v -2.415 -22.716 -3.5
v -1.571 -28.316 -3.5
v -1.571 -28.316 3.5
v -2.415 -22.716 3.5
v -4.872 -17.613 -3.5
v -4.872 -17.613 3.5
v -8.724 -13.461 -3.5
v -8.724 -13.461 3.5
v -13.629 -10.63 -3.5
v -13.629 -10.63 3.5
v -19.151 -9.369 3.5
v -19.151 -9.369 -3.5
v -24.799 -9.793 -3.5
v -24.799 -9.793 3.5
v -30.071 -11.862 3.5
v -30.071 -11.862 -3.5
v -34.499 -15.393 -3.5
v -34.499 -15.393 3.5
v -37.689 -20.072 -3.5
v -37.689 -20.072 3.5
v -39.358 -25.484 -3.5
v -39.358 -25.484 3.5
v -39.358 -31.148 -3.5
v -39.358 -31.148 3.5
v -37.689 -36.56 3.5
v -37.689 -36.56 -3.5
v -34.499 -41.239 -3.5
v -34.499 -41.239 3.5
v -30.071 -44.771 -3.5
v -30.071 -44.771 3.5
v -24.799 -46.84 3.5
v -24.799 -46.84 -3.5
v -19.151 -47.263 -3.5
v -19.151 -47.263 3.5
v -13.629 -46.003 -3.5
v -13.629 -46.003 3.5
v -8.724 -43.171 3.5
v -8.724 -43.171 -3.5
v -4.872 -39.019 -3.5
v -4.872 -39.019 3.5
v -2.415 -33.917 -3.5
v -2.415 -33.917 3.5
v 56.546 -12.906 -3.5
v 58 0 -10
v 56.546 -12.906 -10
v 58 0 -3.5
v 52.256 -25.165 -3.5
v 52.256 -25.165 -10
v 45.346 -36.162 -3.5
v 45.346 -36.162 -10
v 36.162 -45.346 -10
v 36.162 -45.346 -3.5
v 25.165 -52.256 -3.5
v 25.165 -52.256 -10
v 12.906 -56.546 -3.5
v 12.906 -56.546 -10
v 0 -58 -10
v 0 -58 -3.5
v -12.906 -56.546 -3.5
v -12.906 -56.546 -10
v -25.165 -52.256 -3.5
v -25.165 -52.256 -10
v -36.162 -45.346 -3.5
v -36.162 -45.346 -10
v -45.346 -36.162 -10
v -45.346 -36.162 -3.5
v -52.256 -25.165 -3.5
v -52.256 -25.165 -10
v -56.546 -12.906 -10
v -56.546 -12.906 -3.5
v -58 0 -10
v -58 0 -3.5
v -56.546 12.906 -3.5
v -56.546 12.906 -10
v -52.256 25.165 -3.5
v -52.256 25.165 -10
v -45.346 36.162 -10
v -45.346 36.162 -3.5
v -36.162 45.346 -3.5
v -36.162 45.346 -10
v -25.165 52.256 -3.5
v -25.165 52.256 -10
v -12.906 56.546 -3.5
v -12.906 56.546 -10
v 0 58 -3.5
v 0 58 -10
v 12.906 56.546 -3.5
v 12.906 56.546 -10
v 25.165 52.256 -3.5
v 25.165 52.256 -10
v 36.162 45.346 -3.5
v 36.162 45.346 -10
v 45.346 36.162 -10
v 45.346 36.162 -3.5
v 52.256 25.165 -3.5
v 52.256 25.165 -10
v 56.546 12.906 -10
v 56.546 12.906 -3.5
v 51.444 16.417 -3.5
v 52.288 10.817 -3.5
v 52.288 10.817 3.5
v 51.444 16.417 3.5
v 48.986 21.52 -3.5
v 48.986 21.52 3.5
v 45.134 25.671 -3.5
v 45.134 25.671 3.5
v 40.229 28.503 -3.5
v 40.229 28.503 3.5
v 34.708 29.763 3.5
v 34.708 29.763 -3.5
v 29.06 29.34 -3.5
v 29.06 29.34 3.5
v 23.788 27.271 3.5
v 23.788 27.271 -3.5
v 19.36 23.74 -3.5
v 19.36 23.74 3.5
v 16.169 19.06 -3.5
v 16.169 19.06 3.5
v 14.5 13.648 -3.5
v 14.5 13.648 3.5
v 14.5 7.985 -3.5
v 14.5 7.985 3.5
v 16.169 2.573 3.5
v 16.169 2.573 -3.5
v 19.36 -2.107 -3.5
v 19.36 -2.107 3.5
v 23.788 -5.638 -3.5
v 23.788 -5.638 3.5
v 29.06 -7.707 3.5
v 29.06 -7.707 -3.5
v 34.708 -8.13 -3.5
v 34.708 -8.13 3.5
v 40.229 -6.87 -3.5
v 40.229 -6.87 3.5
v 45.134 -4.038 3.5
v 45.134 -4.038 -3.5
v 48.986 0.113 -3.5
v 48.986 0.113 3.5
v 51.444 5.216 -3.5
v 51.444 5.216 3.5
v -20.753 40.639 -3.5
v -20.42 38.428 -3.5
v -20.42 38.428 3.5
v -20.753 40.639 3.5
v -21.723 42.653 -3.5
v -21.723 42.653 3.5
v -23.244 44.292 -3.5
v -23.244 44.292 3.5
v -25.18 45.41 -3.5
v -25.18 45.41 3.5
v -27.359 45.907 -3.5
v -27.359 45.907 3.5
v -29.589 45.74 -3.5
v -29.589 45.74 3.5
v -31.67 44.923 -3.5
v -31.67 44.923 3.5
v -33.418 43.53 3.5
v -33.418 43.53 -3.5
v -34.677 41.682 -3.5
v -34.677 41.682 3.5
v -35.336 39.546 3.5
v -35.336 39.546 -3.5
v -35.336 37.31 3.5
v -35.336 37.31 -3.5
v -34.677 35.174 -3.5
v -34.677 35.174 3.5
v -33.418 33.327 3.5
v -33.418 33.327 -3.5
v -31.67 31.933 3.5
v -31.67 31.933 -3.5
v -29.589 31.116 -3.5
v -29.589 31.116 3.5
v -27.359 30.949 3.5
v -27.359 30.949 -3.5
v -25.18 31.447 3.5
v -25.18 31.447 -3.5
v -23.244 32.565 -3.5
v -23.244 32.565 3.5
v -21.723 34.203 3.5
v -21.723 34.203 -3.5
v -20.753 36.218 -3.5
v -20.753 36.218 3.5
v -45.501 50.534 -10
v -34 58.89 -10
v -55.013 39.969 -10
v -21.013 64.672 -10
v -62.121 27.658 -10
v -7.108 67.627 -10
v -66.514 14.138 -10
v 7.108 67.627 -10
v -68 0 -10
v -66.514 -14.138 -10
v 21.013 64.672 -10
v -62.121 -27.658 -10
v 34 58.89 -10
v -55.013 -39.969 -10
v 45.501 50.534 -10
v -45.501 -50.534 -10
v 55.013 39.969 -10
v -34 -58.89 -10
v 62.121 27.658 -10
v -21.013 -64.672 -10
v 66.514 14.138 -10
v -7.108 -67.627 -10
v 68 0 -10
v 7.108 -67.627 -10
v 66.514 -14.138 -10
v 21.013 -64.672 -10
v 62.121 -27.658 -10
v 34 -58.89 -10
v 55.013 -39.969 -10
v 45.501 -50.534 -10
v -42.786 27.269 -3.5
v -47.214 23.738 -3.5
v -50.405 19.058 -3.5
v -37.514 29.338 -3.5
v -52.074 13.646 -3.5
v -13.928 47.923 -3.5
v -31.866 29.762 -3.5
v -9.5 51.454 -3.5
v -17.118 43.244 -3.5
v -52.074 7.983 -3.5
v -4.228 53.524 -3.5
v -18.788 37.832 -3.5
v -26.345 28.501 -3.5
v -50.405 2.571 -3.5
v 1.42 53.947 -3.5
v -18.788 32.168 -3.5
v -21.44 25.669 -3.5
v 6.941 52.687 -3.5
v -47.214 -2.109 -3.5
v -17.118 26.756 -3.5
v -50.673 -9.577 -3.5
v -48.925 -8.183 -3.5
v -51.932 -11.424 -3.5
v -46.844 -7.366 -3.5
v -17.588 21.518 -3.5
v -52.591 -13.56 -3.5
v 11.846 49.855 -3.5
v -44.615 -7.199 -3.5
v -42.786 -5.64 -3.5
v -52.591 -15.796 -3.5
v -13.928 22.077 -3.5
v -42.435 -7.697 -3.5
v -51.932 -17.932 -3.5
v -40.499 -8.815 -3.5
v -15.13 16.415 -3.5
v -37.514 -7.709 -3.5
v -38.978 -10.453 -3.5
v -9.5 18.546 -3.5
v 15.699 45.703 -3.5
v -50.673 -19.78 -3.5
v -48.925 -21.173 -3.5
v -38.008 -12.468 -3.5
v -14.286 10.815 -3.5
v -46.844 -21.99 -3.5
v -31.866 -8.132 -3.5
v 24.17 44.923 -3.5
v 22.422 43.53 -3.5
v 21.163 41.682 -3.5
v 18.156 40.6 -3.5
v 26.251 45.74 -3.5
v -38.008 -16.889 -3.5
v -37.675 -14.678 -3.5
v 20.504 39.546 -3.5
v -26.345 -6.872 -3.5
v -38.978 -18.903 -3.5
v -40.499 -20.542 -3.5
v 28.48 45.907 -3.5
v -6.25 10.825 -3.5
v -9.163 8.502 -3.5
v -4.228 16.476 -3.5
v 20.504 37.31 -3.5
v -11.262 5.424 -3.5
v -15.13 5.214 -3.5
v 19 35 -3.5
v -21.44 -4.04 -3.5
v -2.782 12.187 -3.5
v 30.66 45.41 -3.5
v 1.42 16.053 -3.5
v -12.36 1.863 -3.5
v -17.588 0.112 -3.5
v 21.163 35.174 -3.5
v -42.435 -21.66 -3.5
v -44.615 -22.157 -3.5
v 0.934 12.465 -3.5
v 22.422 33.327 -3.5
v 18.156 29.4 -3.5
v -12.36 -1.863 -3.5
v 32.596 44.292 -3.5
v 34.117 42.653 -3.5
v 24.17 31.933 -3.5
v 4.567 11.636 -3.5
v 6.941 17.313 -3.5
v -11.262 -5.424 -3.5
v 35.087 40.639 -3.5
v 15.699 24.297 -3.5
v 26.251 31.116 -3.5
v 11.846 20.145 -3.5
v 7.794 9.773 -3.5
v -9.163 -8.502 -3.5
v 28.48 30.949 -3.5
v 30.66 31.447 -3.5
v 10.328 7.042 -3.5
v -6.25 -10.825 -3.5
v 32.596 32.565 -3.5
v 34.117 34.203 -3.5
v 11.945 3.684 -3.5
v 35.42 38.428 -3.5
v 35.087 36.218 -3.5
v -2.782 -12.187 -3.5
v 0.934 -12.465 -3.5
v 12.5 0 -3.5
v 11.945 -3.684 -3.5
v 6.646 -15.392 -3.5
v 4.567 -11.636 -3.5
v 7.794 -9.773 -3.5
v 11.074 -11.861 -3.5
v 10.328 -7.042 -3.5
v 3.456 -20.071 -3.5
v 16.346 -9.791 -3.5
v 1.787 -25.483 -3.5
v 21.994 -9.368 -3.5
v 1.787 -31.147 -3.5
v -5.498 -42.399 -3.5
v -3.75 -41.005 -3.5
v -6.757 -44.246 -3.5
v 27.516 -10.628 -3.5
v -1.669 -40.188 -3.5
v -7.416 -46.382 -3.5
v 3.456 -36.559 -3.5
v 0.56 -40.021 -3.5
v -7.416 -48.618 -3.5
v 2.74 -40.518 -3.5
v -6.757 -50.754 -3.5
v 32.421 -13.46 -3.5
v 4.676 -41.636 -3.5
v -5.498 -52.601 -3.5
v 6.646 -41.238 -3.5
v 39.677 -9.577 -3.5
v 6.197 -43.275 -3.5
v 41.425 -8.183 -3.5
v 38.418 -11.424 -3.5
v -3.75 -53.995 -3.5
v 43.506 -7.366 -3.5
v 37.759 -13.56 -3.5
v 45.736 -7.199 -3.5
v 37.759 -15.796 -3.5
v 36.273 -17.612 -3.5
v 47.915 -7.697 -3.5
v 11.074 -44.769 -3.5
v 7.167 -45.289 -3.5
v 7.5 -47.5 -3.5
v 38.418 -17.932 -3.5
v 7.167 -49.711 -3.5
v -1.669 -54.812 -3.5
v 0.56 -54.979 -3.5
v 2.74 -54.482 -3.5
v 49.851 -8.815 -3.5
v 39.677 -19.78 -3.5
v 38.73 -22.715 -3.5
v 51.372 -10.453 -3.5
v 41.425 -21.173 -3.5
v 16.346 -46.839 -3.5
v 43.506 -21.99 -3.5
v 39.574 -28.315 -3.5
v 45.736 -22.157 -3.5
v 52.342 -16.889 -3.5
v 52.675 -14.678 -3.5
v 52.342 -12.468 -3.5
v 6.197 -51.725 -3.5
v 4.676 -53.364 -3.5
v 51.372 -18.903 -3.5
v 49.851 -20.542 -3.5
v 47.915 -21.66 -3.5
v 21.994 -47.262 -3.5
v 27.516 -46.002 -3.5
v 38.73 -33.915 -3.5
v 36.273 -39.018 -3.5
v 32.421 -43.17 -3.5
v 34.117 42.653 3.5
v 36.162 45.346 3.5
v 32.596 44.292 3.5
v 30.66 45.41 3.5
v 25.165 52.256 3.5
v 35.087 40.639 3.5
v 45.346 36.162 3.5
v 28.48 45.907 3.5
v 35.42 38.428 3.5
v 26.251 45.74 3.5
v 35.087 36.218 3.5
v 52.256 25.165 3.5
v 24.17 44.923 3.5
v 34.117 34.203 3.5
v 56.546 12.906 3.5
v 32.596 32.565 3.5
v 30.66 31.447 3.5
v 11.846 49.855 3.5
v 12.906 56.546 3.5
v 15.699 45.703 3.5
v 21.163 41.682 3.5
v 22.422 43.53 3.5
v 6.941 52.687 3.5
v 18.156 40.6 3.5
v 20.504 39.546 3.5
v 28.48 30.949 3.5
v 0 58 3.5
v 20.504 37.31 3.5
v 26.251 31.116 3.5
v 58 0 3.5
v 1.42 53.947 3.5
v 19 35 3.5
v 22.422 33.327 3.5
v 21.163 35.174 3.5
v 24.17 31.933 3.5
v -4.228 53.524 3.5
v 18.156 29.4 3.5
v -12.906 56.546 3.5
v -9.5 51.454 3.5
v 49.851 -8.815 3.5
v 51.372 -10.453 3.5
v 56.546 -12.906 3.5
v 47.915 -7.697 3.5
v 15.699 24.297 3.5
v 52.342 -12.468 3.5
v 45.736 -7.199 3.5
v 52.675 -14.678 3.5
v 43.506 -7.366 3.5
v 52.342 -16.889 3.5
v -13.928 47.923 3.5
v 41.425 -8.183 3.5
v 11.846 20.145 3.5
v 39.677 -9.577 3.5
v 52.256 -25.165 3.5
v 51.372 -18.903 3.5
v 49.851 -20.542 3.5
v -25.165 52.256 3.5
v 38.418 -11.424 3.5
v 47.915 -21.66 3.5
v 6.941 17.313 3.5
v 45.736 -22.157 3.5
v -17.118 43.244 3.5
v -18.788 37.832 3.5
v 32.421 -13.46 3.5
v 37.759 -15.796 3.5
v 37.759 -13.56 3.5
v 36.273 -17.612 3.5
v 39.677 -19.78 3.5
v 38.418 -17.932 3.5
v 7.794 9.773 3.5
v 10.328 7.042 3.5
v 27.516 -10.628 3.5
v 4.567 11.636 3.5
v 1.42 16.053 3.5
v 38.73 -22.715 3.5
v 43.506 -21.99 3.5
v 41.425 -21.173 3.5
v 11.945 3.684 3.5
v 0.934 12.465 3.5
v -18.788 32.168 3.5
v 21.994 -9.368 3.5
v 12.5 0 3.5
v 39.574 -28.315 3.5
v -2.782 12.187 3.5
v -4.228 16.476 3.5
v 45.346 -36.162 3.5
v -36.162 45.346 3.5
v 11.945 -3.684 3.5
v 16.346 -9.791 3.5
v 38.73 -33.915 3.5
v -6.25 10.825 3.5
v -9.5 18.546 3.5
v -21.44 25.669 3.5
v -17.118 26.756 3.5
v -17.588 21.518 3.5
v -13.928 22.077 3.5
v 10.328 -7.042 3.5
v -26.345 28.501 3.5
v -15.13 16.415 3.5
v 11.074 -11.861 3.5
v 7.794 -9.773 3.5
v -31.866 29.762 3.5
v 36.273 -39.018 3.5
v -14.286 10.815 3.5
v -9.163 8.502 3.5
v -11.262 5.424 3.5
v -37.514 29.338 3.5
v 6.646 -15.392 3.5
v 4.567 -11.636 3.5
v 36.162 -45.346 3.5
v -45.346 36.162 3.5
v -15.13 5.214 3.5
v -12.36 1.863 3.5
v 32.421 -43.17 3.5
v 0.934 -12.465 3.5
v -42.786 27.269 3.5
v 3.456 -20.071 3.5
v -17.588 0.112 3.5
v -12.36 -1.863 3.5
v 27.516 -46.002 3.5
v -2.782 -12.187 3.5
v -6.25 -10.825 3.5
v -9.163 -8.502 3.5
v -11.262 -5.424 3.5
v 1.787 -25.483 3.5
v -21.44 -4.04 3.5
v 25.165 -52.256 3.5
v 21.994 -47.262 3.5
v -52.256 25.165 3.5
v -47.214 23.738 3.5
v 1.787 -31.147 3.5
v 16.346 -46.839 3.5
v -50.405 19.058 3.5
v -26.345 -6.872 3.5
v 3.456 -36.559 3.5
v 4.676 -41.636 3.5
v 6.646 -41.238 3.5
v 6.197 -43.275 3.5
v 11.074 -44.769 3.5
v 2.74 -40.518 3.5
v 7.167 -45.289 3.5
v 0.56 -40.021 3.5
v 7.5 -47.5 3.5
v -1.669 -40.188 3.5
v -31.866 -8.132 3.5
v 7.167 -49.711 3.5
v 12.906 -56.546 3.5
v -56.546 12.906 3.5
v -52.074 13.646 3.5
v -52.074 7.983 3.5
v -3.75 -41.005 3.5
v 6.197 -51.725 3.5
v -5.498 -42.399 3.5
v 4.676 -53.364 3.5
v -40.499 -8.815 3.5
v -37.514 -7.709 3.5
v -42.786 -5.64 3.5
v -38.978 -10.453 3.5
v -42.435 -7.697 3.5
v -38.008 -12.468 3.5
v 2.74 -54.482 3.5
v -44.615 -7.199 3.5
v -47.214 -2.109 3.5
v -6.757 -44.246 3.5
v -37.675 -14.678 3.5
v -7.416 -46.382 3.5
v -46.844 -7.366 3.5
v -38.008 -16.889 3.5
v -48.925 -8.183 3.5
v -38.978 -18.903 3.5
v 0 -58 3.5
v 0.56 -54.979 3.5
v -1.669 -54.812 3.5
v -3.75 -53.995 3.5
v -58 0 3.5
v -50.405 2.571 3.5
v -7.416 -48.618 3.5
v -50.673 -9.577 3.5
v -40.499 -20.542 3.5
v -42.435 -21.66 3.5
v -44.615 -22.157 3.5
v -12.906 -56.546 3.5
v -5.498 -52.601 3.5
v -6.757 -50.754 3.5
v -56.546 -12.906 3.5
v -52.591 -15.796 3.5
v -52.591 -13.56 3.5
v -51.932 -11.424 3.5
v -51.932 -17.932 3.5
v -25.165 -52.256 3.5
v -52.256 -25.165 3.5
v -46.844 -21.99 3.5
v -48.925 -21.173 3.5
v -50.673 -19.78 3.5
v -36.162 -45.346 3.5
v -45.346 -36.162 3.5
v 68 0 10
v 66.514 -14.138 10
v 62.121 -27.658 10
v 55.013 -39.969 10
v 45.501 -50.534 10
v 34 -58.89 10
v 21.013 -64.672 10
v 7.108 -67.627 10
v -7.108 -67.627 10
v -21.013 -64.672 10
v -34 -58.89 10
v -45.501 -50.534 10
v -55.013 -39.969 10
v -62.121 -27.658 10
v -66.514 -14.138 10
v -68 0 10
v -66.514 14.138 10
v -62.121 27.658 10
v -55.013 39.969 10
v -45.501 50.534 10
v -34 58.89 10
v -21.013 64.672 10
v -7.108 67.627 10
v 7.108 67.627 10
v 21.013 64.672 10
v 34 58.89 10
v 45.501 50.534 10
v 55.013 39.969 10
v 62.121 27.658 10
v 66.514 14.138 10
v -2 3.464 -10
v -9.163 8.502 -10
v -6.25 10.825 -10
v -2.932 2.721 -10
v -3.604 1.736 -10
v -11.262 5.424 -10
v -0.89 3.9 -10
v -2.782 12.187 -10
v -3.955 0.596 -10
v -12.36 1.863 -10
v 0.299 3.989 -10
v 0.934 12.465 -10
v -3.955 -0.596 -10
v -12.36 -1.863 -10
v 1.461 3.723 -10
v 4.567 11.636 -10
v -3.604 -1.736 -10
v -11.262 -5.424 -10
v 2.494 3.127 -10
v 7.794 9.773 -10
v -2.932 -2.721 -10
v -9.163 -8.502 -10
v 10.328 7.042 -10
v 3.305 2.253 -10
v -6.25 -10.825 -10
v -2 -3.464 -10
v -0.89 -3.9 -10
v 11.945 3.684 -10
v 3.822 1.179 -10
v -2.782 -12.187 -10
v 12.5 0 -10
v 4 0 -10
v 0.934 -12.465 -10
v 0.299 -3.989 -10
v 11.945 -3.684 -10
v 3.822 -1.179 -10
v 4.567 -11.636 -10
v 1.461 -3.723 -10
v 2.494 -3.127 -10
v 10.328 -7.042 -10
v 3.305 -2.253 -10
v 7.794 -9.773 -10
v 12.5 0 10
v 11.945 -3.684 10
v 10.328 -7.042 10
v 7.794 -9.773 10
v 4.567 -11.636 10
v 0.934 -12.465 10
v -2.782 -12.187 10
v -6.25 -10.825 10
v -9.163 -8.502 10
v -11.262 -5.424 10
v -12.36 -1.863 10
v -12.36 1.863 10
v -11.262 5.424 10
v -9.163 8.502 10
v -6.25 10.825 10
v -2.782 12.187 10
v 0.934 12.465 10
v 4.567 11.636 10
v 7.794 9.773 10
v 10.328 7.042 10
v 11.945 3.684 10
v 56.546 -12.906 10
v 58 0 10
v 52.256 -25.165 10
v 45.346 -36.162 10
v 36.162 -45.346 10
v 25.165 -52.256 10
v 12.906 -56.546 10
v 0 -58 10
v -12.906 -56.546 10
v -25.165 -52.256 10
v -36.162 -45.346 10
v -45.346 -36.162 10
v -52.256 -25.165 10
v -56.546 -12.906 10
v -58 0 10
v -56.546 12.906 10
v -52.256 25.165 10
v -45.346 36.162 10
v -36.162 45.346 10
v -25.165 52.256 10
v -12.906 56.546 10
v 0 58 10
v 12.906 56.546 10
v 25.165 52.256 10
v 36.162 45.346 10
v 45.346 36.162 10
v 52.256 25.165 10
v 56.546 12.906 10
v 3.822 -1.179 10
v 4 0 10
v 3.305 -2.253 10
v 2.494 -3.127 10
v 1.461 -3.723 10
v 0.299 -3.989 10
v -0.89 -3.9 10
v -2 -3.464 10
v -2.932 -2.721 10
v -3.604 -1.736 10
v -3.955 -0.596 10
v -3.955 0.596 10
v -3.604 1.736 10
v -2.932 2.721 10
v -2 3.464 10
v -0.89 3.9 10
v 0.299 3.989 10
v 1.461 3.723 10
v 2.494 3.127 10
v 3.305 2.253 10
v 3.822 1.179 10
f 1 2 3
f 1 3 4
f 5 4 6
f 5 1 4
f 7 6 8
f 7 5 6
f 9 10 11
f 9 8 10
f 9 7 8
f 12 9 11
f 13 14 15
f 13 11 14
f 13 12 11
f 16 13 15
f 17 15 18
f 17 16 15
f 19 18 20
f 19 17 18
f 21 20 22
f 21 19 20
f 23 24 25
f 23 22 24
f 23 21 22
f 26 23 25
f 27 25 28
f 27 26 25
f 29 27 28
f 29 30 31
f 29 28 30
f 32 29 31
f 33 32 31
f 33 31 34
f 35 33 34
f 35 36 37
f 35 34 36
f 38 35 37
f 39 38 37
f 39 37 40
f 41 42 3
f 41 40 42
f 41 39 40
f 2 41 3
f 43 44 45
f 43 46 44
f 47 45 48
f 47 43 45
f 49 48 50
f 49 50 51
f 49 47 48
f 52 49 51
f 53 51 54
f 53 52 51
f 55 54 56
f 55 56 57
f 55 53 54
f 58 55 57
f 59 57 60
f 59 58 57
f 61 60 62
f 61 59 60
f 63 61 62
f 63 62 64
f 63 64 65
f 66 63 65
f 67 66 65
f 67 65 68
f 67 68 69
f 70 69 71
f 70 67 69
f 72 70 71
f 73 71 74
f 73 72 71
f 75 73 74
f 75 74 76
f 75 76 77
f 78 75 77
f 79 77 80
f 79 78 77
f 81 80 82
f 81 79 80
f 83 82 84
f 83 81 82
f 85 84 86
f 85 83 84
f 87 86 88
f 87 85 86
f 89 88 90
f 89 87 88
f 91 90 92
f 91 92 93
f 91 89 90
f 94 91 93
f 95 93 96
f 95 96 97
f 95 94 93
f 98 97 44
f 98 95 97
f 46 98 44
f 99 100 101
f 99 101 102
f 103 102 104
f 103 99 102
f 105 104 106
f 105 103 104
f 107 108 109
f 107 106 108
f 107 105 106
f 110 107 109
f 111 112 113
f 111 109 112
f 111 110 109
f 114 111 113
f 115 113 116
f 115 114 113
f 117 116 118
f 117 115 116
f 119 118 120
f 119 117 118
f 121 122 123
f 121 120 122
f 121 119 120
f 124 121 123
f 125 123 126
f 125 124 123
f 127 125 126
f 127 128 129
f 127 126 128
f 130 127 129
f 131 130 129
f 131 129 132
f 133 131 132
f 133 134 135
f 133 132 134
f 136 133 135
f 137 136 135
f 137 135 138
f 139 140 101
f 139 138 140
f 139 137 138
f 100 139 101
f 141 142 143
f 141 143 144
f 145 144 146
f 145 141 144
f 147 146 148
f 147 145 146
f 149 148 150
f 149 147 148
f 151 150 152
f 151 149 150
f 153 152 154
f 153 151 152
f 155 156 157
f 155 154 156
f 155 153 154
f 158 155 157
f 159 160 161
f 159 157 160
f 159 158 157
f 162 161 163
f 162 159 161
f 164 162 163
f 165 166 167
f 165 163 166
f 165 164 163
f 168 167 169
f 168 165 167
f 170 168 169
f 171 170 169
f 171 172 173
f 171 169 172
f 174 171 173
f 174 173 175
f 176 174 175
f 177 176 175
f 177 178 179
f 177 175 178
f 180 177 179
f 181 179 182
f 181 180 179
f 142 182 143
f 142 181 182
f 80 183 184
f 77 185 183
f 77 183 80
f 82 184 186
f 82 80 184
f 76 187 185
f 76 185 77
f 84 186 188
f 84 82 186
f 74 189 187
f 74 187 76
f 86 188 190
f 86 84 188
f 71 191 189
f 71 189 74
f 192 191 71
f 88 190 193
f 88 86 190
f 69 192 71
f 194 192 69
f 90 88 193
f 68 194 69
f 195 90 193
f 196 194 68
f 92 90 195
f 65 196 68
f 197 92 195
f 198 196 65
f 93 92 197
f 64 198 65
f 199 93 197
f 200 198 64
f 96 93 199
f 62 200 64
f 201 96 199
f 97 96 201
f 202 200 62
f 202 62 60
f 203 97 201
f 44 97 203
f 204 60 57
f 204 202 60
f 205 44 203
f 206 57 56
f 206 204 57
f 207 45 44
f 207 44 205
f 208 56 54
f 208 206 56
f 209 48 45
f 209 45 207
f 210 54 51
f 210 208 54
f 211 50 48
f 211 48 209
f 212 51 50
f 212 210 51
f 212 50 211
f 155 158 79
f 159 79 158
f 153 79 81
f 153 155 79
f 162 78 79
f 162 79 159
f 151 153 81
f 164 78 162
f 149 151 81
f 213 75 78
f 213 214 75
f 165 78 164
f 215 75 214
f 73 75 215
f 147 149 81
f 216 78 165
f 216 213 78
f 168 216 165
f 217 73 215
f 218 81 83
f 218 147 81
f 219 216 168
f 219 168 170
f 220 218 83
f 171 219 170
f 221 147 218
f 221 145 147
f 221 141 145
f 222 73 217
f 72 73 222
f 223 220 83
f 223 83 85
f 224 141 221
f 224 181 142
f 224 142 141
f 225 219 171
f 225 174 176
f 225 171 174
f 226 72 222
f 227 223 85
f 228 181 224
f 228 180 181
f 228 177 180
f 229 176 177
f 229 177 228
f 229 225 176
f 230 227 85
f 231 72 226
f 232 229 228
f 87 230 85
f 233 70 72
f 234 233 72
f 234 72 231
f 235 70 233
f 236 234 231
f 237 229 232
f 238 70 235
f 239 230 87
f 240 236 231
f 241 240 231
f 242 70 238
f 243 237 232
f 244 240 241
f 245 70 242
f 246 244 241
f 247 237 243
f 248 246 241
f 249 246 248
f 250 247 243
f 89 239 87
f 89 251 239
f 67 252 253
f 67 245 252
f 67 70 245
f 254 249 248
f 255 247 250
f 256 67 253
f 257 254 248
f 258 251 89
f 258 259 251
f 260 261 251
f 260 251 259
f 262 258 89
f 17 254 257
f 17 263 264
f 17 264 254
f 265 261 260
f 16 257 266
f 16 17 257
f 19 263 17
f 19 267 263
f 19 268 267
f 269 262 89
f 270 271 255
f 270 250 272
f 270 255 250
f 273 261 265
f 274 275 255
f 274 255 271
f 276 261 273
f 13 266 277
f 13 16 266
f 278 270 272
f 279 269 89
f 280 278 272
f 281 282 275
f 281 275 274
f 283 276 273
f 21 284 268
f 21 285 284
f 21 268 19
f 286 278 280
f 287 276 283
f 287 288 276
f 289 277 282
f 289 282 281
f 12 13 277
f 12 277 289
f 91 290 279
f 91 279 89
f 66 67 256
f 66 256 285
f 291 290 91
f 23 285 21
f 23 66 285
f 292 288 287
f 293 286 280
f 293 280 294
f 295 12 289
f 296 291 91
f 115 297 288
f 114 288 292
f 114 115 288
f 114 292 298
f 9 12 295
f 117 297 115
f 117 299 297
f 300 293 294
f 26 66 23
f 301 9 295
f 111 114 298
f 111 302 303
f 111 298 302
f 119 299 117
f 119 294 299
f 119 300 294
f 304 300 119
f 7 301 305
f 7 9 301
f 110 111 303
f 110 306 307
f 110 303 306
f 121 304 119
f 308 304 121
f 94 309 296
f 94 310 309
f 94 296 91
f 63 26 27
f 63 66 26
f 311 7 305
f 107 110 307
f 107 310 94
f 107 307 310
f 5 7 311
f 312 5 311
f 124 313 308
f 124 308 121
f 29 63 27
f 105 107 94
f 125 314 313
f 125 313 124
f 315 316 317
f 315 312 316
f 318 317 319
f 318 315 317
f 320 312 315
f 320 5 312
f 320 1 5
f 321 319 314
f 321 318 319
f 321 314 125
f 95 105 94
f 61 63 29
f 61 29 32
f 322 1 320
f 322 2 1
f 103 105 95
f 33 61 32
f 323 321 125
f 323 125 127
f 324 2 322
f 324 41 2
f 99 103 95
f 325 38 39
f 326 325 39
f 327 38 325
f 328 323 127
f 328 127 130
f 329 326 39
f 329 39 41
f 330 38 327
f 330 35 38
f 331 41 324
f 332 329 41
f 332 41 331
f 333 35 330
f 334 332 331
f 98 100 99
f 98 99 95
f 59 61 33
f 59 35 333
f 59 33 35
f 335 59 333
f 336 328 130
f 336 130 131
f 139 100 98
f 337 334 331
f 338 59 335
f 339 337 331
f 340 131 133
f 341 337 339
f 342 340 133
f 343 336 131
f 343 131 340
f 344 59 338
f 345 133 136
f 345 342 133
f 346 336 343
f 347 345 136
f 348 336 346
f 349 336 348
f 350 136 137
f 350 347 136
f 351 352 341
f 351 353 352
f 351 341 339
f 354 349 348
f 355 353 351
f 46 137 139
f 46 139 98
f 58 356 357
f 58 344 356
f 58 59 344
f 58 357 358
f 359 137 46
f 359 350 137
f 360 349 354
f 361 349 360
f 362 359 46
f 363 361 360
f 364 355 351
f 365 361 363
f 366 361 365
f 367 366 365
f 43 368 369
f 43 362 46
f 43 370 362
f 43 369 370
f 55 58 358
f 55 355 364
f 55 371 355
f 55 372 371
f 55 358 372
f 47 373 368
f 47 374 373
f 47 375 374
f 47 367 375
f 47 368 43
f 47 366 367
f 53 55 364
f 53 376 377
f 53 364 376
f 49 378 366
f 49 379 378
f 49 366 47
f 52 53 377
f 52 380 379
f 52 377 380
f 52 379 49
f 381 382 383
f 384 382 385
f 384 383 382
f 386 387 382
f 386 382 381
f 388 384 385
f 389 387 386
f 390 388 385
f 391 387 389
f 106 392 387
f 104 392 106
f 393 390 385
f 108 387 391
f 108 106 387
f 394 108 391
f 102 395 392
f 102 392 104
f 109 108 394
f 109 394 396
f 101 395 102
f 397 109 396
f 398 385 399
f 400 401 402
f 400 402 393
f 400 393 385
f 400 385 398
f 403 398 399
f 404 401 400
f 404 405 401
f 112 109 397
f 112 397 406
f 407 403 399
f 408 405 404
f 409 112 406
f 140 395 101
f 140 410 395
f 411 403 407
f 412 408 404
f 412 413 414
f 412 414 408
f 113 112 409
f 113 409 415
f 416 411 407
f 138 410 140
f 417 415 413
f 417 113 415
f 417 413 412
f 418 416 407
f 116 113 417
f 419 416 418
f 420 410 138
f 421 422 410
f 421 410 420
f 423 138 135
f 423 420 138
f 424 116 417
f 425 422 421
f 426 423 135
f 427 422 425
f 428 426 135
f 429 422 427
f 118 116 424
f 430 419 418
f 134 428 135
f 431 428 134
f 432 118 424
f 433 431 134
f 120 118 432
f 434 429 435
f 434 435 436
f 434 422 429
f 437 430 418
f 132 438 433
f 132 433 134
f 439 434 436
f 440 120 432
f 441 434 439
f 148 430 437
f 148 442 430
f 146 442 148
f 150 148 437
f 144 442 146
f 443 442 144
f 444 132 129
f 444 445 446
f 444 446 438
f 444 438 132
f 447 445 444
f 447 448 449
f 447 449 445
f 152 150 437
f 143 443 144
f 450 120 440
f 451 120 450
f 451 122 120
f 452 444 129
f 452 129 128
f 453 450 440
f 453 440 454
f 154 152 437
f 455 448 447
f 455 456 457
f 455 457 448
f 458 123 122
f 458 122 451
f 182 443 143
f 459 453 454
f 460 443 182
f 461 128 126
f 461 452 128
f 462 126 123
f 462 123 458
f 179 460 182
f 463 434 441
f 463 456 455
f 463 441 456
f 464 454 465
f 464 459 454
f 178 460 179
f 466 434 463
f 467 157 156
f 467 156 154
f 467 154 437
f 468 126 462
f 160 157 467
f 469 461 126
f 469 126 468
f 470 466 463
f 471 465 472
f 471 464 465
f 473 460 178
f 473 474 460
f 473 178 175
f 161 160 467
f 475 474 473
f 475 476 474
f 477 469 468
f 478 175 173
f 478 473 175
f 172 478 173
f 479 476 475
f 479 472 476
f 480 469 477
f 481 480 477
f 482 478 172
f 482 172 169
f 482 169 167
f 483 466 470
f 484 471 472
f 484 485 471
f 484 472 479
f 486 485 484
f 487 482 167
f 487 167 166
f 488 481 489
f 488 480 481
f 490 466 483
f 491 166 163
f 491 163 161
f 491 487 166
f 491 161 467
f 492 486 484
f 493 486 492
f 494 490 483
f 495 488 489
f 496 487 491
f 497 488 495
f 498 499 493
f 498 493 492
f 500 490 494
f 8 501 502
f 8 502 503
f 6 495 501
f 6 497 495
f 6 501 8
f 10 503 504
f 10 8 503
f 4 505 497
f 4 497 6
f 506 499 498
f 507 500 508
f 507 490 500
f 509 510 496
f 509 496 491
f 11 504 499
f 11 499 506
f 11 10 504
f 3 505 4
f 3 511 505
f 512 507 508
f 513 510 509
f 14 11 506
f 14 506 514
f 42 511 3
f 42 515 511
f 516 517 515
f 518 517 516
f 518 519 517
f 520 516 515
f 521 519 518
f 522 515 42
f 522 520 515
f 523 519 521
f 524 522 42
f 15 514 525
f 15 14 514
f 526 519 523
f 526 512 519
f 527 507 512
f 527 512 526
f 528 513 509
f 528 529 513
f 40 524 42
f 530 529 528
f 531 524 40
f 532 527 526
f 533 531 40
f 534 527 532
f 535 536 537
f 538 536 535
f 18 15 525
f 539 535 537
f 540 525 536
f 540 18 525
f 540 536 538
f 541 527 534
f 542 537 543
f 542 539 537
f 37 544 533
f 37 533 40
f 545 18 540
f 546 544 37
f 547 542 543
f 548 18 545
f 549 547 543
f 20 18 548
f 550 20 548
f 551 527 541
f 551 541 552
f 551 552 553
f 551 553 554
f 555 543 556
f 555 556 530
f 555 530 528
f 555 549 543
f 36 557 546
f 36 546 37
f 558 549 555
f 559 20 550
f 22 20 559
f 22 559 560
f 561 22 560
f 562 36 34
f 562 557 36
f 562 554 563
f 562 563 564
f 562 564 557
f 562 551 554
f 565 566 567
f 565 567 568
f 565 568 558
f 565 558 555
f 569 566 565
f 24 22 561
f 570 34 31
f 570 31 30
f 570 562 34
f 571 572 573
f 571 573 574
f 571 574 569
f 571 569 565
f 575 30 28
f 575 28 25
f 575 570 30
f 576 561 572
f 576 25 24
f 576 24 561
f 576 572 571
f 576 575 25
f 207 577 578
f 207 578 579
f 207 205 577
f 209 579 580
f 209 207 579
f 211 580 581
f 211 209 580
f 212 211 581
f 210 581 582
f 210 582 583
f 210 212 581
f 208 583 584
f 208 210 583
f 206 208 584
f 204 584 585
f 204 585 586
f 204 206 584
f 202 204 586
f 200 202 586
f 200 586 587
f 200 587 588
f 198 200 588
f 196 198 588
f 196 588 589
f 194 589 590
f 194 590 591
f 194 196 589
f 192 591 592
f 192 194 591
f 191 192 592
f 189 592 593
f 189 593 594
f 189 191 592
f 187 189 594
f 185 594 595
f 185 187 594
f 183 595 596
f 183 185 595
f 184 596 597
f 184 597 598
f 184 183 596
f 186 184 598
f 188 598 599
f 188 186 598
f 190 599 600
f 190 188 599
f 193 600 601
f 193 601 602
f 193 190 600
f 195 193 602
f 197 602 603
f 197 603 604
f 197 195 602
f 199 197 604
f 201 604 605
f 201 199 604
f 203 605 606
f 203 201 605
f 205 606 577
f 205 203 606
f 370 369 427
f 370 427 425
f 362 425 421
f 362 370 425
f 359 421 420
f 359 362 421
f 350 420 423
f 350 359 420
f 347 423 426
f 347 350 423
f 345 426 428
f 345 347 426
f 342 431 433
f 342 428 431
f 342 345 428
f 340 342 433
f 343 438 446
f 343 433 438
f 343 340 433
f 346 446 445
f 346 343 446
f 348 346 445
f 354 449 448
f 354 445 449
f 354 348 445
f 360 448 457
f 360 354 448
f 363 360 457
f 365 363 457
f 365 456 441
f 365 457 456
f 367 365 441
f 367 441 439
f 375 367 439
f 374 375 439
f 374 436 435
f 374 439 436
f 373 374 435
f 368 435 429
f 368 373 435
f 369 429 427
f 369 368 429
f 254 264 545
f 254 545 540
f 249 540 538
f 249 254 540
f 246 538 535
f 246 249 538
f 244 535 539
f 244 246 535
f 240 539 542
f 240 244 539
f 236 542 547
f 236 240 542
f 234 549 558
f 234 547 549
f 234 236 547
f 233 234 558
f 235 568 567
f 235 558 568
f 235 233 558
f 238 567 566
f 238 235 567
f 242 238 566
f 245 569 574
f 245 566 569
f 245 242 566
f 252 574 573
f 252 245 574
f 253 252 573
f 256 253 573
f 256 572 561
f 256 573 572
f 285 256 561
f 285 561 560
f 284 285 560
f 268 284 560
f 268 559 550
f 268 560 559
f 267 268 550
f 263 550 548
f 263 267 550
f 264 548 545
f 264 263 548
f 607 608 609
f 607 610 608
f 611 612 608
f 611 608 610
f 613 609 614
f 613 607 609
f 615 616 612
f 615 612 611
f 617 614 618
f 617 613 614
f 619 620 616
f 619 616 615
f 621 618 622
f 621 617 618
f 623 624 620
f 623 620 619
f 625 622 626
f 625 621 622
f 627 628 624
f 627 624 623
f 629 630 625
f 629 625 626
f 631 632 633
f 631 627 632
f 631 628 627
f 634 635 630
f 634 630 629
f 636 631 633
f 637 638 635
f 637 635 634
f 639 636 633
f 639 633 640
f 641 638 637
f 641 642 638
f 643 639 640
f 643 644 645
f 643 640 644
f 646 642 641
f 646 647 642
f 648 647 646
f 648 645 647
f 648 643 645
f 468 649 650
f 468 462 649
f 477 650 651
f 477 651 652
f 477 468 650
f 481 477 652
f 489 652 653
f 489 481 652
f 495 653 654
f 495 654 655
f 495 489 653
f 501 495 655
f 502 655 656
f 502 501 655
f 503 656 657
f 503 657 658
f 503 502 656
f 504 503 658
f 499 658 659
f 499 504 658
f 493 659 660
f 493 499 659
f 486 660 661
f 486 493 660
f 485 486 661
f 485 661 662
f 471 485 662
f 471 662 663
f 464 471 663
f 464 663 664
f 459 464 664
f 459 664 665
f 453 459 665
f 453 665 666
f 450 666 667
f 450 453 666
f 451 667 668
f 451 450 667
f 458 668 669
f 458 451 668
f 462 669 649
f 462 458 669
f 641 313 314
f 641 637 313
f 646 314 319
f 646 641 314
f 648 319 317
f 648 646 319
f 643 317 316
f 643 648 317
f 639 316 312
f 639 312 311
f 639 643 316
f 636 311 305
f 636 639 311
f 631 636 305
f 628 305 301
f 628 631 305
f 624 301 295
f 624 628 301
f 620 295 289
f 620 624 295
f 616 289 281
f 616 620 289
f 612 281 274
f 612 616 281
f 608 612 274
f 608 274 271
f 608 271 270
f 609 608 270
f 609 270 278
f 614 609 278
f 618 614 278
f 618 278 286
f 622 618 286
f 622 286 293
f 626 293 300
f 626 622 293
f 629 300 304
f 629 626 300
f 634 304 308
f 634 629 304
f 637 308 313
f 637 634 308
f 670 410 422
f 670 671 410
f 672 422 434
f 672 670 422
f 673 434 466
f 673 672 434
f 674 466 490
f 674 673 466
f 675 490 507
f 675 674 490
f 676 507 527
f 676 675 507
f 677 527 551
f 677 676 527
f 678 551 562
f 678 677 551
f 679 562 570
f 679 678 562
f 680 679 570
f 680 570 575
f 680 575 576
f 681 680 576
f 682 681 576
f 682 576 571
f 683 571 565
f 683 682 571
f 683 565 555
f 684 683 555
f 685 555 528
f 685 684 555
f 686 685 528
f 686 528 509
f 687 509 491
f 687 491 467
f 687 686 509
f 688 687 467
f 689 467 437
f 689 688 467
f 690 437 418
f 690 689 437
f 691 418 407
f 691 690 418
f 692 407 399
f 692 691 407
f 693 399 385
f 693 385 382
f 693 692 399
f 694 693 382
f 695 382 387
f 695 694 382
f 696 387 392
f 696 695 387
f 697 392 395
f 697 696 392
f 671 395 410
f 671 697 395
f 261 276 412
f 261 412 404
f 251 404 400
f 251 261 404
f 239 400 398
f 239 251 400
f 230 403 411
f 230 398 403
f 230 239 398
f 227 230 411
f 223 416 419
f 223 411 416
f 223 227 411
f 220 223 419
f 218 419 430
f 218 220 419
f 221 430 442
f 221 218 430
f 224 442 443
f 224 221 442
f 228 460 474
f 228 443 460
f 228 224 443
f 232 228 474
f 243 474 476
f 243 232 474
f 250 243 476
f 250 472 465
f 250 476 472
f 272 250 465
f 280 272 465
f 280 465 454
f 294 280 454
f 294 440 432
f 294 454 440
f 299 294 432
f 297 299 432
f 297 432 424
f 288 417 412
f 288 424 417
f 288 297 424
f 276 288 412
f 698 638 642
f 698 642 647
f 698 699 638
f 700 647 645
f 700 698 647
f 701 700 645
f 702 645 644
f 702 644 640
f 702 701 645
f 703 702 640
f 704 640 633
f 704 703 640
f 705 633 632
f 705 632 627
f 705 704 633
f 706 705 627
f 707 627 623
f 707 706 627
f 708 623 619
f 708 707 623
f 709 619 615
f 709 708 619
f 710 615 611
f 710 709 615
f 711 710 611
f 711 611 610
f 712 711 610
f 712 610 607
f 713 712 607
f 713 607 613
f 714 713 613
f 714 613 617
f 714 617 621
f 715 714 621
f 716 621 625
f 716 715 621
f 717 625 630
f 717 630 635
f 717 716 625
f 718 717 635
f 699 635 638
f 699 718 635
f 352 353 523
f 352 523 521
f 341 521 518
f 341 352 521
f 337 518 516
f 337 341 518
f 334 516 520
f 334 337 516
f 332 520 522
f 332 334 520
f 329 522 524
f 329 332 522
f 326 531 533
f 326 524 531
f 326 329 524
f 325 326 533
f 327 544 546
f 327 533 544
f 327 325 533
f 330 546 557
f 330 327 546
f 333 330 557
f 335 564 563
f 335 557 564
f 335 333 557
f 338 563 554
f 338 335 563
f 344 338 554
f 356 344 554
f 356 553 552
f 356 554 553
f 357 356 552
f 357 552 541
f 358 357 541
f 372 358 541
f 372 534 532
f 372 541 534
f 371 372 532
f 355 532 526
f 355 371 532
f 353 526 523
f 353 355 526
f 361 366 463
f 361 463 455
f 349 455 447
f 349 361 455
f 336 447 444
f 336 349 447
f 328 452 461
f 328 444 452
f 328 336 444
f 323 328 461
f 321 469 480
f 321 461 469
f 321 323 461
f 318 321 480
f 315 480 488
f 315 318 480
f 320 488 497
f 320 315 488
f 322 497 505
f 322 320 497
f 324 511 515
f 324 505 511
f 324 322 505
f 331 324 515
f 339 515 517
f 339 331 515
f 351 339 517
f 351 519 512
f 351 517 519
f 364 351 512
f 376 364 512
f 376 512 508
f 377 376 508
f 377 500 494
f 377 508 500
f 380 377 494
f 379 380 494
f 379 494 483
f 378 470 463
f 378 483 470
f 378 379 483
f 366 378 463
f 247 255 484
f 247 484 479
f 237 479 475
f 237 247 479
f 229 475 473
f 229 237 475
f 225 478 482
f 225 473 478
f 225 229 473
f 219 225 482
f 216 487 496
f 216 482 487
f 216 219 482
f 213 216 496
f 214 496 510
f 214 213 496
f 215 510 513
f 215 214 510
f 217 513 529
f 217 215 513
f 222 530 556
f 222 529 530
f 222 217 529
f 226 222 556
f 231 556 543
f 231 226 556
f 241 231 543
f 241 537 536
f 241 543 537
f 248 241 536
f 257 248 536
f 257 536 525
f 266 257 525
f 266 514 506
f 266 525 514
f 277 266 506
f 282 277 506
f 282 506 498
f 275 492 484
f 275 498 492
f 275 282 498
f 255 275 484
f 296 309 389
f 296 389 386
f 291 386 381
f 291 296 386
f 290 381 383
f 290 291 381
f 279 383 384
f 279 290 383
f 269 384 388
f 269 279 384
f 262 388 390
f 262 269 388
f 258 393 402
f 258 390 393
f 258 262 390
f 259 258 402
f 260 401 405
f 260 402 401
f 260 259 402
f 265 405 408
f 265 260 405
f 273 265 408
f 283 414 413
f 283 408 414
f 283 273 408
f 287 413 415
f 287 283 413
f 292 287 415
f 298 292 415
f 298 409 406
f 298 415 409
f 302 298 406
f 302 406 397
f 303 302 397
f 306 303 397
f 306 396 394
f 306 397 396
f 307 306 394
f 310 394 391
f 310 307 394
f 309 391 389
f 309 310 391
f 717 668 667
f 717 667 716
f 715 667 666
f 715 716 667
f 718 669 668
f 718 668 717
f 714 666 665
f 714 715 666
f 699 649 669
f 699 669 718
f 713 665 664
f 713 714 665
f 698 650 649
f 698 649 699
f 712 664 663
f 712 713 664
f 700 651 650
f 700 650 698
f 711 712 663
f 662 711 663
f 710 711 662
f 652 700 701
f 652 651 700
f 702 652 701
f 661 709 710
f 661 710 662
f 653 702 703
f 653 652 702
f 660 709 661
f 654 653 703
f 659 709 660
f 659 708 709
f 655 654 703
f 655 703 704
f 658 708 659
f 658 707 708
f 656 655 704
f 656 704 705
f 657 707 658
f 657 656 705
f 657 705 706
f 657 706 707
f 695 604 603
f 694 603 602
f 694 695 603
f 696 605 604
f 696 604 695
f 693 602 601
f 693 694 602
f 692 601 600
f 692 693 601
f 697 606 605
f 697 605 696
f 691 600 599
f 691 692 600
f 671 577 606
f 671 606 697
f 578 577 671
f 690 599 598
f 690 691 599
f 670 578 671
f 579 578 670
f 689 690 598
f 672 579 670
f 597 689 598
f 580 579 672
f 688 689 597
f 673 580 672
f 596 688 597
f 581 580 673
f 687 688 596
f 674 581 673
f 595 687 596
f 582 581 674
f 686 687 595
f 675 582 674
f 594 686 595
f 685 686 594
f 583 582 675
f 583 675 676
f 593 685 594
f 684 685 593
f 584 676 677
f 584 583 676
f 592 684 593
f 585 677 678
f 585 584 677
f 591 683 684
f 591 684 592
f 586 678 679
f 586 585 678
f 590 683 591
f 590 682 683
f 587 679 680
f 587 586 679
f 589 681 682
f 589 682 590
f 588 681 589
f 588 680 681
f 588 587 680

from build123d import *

# Parameters (mm, degrees)
CUT_EXTRUDE1_DEPTH      = 97.685055722
CUT_EXTRUDE1_DEPTH_BACK = 97.685055722
SKETCH2_R               = 7.5
SKETCH2_R_2             = 19


with BuildPart() as part:
    # Sketch1 → Revolve1 (revolve)
    with BuildSketch(Plane(origin=(0, 0, 0), x_dir=(0, 0, -1), z_dir=(1, 0, 0)), mode=Mode.PRIVATE) as revolve1_sk:
        Polygon((-10, 68), (10, 68), (10, 58), (3.5, 58), (3.5, 12.5), (10, 12.5), (10, 4), (-10, 4), (-10, 12.5), (-3.5, 12.5), (-3.5, 58), (-10, 58), align=None)
    revolve(revolve1_sk.sketch.rotate(Axis((0, 0, 51.457627119), (0, 0, -1)), 90), axis=Axis((0, 0, 51.457627119), (0, 0, -1)))

    # Sketch2 → Cut-Extrude1 (cut, two sides: drawn at the far end of the back side and taken through both)
    with BuildSketch(Plane.XY.offset(-CUT_EXTRUDE1_DEPTH_BACK)):
        with Locations((0, -47.5)):
            Circle(SKETCH2_R)
        with Locations((45.175184524, -14.678307233)):
            Circle(SKETCH2_R)
        with Locations((27.919799484, 38.428307233)):
            Circle(SKETCH2_R)
        with Locations((-27.919799484, 38.428307233)):
            Circle(SKETCH2_R)
        with Locations((-45.175184524, -14.678307233)):
            Circle(SKETCH2_R)
        with Locations((0, 35)):
            Circle(SKETCH2_R_2)
        with Locations((33.287669053, 10.81654586)):
            Circle(SKETCH2_R_2)
        with Locations((20.574292847, -28.315007018)):
            Circle(SKETCH2_R_2)
        with Locations((-20.570674813, -28.316182588)):
            Circle(SKETCH2_R_2)
        with Locations((-33.286287087, 10.814643747)):
            Circle(SKETCH2_R_2)
    extrude(amount=CUT_EXTRUDE1_DEPTH + CUT_EXTRUDE1_DEPTH_BACK, mode=Mode.SUBTRACT)


solid = part.part
